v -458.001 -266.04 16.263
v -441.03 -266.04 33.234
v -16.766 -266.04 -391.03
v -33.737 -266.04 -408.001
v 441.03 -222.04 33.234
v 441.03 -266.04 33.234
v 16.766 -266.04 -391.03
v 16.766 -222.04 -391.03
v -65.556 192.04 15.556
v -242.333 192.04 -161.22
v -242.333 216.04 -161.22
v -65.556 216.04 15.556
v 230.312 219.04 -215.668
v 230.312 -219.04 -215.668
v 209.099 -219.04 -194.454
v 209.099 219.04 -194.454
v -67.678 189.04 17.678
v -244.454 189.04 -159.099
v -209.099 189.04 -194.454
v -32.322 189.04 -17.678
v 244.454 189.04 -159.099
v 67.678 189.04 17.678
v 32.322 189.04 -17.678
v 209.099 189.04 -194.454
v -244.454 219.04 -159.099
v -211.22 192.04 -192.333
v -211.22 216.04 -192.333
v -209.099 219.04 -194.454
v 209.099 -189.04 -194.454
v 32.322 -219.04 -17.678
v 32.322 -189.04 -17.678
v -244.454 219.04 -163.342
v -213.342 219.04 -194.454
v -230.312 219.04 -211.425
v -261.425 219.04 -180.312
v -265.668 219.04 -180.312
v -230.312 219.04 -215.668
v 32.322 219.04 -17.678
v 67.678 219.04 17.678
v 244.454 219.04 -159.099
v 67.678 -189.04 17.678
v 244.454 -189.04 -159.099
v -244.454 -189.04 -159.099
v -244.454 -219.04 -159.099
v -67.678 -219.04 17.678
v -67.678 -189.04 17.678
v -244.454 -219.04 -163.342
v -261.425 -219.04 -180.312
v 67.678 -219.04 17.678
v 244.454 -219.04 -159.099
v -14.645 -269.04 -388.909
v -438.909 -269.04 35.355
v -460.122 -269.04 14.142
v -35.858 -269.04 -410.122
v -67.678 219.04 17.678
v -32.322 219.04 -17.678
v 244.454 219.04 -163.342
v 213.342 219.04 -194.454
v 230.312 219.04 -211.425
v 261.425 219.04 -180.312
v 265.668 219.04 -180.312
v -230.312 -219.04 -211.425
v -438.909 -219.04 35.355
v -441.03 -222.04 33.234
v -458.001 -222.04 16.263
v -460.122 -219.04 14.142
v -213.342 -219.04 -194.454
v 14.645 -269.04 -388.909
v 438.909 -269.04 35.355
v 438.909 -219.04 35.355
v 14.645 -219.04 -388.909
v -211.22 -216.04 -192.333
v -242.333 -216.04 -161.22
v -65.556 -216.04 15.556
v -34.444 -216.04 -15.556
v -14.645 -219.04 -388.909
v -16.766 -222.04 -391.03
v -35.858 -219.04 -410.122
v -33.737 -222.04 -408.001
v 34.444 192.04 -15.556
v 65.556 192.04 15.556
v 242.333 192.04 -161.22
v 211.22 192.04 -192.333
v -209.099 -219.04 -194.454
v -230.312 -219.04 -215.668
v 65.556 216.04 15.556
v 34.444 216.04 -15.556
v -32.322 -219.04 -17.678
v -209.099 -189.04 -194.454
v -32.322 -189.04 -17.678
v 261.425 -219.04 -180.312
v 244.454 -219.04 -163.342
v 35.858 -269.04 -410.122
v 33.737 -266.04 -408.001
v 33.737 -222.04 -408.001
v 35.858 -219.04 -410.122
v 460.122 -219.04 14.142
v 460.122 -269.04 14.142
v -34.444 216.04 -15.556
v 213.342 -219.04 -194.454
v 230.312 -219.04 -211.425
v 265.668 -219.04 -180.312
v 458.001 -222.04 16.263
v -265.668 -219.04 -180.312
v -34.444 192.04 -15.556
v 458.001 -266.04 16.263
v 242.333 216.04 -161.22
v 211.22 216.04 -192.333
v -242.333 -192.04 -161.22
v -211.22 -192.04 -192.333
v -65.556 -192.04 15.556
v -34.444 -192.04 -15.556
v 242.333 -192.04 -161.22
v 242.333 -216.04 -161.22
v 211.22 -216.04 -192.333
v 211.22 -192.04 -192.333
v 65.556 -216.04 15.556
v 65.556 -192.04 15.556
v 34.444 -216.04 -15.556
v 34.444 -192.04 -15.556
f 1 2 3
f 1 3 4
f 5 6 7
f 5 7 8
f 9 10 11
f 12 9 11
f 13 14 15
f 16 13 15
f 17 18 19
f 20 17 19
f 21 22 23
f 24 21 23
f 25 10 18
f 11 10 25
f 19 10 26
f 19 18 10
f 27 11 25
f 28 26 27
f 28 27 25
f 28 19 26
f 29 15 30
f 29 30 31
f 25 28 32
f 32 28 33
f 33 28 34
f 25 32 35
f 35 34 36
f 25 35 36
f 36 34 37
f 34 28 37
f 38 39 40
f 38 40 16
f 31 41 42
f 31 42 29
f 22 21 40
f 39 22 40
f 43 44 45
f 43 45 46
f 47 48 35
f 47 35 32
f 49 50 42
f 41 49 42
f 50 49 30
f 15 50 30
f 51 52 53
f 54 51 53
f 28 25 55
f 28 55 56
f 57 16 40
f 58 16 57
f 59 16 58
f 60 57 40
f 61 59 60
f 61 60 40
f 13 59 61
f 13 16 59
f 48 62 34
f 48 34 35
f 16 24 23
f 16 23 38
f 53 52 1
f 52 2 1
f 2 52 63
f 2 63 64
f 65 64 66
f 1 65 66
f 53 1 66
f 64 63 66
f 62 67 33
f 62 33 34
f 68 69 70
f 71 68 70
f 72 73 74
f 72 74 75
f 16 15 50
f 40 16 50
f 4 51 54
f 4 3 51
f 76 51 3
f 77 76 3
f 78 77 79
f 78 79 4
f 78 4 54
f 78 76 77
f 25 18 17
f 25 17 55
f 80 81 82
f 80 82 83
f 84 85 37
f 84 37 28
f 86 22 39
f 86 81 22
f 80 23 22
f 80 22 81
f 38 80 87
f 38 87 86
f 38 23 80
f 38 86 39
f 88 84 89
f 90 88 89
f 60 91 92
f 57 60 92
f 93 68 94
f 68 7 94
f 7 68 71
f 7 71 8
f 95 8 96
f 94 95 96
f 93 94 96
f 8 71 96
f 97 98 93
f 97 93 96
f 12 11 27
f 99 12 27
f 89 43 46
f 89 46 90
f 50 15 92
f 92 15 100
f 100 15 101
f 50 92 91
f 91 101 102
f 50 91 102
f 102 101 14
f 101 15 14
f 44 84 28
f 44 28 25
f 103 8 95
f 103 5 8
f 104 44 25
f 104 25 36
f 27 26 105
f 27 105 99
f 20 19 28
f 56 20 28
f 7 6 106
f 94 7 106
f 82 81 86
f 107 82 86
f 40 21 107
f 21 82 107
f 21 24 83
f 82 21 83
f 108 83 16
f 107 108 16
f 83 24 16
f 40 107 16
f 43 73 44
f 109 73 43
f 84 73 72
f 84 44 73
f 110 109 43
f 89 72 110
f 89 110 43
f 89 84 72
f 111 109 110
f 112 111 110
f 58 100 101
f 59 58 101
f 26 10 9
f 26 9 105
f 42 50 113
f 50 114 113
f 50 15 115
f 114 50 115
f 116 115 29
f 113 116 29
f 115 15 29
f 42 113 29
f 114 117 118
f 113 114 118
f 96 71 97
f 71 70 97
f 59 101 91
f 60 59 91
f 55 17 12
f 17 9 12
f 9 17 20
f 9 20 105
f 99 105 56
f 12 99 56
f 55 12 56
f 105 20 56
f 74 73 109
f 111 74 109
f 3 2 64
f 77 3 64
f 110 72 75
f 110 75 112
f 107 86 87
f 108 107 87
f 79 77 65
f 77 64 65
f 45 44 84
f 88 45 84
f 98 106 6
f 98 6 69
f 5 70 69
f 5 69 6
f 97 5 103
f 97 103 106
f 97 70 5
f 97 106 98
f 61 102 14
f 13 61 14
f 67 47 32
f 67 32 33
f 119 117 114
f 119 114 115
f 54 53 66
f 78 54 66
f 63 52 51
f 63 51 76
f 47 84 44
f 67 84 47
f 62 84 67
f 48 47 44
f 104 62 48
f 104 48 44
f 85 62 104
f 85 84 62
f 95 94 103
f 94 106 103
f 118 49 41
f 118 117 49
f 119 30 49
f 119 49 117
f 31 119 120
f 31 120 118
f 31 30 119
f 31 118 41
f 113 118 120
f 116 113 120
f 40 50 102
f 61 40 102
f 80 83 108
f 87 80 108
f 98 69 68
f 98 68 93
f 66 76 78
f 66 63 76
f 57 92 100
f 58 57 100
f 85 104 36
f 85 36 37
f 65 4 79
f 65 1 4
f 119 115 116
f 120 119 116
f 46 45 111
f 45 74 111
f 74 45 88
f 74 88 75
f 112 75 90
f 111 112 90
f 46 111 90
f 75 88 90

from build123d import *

# Parameters (mm, degrees)
SKETCH8_W                = 30
SKETCH8_H                = 50
SKETCH8_W_2              = 24
SKETCH8_H_2              = 44
BOSS_EXTRUDE4_DEPTH      = 250
BOSS_EXTRUDE4_2_DEPTH    = 250
BOSS_EXTRUDE5_DEPTH      = 219.04
BOSS_EXTRUDE5_DEPTH_BACK = 219.04
SKETCH10_W               = 30
SKETCH10_H               = 50
SKETCH10_W_2             = 24
SKETCH10_H_2             = 44
BOSS_EXTRUDE6_DEPTH      = 300


with BuildPart() as part:
    # Sketch8 → Boss-Extrude4 (new body)
    with BuildSketch(Plane(origin=(25, 0, -25), x_dir=(0, 1, 0), z_dir=(-0.7071067811865464, 0, 0.7071067811865488))):
        with Locations((204.04, -35.355339059)):
            Rectangle(SKETCH8_W, SKETCH8_H)
        with Locations((204.04, -35.355339059)):
            Rectangle(SKETCH8_W_2, SKETCH8_H_2, mode=Mode.SUBTRACT)
    extrude(amount=-BOSS_EXTRUDE4_DEPTH)


with BuildPart() as body_2:
    # Sketch8 → Boss-Extrude4 2 (new body)
    with BuildSketch(Plane(origin=(25, 0, -25), x_dir=(0, 1, 0), z_dir=(-0.7071067811865464, 0, 0.7071067811865488))):
        with Locations((-204.04, -35.355339059)):
            Rectangle(SKETCH8_W, SKETCH8_H)
        with Locations((-204.04, -35.355339059)):
            Rectangle(SKETCH8_W_2, SKETCH8_H_2, mode=Mode.SUBTRACT)
    extrude(amount=-BOSS_EXTRUDE4_2_DEPTH)


with BuildPart() as body_3:
    # Sketch9 → Boss-Extrude5 (new, two sides: drawn at the far end of the back side and taken through both)
    with BuildSketch(Plane(origin=(0, 0, 0), x_dir=(1, 0, 0), z_dir=(0, 1, 0)).offset(-BOSS_EXTRUDE5_DEPTH_BACK)):
        Polygon((209.099025767, 194.454364826), (244.454364826, 159.099025767), (265.667568262, 180.312229203), (230.312229203, 215.667568262), align=None)
        Polygon((213.341666454, 194.454364826), (230.312229203, 211.424927575), (261.424927575, 180.312229203), (244.454364826, 163.341666454), align=None, mode=Mode.SUBTRACT)
    extrude(amount=BOSS_EXTRUDE5_DEPTH + BOSS_EXTRUDE5_DEPTH_BACK)


with BuildPart() as body_4:
    # Sketch10 → Boss-Extrude6 (new, symmetric)
    with BuildSketch(Plane(origin=(25, 0, 25), x_dir=(0.7071067811865457, 0, -0.7071067811865493), z_dir=(0.7071067811865493, 0, 0.7071067811865457))):
        with Locations((300.355339059, -244.04)):
            Rectangle(SKETCH10_W, SKETCH10_H)
        with Locations((300.355339059, -244.04)):
            Rectangle(SKETCH10_W_2, SKETCH10_H_2, mode=Mode.SUBTRACT)
    extrude(amount=BOSS_EXTRUDE6_DEPTH, both=True)


with BuildPart() as body_5:
    # Mirror1: mirrored copy
    add(part.part.mirror(Plane(origin=(0, 0, 0), x_dir=(0, 0, 1), z_dir=(1, 0, 0))))


with BuildPart() as body_6:
    # Mirror1 2: mirrored copy
    add(body_2.part.mirror(Plane(origin=(0, 0, 0), x_dir=(0, 0, 1), z_dir=(1, 0, 0))))


with BuildPart() as body_7:
    # Mirror1 3: mirrored copy
    add(body_3.part.mirror(Plane(origin=(0, 0, 0), x_dir=(0, 0, 1), z_dir=(1, 0, 0))))


with BuildPart() as body_8:
    # Mirror1 4: mirrored copy
    add(body_4.part.mirror(Plane(origin=(0, 0, 0), x_dir=(0, 0, 1), z_dir=(1, 0, 0))))


solid = Compound([part.part, body_2.part, body_3.part, body_4.part, body_5.part, body_6.part, body_7.part, body_8.part])
